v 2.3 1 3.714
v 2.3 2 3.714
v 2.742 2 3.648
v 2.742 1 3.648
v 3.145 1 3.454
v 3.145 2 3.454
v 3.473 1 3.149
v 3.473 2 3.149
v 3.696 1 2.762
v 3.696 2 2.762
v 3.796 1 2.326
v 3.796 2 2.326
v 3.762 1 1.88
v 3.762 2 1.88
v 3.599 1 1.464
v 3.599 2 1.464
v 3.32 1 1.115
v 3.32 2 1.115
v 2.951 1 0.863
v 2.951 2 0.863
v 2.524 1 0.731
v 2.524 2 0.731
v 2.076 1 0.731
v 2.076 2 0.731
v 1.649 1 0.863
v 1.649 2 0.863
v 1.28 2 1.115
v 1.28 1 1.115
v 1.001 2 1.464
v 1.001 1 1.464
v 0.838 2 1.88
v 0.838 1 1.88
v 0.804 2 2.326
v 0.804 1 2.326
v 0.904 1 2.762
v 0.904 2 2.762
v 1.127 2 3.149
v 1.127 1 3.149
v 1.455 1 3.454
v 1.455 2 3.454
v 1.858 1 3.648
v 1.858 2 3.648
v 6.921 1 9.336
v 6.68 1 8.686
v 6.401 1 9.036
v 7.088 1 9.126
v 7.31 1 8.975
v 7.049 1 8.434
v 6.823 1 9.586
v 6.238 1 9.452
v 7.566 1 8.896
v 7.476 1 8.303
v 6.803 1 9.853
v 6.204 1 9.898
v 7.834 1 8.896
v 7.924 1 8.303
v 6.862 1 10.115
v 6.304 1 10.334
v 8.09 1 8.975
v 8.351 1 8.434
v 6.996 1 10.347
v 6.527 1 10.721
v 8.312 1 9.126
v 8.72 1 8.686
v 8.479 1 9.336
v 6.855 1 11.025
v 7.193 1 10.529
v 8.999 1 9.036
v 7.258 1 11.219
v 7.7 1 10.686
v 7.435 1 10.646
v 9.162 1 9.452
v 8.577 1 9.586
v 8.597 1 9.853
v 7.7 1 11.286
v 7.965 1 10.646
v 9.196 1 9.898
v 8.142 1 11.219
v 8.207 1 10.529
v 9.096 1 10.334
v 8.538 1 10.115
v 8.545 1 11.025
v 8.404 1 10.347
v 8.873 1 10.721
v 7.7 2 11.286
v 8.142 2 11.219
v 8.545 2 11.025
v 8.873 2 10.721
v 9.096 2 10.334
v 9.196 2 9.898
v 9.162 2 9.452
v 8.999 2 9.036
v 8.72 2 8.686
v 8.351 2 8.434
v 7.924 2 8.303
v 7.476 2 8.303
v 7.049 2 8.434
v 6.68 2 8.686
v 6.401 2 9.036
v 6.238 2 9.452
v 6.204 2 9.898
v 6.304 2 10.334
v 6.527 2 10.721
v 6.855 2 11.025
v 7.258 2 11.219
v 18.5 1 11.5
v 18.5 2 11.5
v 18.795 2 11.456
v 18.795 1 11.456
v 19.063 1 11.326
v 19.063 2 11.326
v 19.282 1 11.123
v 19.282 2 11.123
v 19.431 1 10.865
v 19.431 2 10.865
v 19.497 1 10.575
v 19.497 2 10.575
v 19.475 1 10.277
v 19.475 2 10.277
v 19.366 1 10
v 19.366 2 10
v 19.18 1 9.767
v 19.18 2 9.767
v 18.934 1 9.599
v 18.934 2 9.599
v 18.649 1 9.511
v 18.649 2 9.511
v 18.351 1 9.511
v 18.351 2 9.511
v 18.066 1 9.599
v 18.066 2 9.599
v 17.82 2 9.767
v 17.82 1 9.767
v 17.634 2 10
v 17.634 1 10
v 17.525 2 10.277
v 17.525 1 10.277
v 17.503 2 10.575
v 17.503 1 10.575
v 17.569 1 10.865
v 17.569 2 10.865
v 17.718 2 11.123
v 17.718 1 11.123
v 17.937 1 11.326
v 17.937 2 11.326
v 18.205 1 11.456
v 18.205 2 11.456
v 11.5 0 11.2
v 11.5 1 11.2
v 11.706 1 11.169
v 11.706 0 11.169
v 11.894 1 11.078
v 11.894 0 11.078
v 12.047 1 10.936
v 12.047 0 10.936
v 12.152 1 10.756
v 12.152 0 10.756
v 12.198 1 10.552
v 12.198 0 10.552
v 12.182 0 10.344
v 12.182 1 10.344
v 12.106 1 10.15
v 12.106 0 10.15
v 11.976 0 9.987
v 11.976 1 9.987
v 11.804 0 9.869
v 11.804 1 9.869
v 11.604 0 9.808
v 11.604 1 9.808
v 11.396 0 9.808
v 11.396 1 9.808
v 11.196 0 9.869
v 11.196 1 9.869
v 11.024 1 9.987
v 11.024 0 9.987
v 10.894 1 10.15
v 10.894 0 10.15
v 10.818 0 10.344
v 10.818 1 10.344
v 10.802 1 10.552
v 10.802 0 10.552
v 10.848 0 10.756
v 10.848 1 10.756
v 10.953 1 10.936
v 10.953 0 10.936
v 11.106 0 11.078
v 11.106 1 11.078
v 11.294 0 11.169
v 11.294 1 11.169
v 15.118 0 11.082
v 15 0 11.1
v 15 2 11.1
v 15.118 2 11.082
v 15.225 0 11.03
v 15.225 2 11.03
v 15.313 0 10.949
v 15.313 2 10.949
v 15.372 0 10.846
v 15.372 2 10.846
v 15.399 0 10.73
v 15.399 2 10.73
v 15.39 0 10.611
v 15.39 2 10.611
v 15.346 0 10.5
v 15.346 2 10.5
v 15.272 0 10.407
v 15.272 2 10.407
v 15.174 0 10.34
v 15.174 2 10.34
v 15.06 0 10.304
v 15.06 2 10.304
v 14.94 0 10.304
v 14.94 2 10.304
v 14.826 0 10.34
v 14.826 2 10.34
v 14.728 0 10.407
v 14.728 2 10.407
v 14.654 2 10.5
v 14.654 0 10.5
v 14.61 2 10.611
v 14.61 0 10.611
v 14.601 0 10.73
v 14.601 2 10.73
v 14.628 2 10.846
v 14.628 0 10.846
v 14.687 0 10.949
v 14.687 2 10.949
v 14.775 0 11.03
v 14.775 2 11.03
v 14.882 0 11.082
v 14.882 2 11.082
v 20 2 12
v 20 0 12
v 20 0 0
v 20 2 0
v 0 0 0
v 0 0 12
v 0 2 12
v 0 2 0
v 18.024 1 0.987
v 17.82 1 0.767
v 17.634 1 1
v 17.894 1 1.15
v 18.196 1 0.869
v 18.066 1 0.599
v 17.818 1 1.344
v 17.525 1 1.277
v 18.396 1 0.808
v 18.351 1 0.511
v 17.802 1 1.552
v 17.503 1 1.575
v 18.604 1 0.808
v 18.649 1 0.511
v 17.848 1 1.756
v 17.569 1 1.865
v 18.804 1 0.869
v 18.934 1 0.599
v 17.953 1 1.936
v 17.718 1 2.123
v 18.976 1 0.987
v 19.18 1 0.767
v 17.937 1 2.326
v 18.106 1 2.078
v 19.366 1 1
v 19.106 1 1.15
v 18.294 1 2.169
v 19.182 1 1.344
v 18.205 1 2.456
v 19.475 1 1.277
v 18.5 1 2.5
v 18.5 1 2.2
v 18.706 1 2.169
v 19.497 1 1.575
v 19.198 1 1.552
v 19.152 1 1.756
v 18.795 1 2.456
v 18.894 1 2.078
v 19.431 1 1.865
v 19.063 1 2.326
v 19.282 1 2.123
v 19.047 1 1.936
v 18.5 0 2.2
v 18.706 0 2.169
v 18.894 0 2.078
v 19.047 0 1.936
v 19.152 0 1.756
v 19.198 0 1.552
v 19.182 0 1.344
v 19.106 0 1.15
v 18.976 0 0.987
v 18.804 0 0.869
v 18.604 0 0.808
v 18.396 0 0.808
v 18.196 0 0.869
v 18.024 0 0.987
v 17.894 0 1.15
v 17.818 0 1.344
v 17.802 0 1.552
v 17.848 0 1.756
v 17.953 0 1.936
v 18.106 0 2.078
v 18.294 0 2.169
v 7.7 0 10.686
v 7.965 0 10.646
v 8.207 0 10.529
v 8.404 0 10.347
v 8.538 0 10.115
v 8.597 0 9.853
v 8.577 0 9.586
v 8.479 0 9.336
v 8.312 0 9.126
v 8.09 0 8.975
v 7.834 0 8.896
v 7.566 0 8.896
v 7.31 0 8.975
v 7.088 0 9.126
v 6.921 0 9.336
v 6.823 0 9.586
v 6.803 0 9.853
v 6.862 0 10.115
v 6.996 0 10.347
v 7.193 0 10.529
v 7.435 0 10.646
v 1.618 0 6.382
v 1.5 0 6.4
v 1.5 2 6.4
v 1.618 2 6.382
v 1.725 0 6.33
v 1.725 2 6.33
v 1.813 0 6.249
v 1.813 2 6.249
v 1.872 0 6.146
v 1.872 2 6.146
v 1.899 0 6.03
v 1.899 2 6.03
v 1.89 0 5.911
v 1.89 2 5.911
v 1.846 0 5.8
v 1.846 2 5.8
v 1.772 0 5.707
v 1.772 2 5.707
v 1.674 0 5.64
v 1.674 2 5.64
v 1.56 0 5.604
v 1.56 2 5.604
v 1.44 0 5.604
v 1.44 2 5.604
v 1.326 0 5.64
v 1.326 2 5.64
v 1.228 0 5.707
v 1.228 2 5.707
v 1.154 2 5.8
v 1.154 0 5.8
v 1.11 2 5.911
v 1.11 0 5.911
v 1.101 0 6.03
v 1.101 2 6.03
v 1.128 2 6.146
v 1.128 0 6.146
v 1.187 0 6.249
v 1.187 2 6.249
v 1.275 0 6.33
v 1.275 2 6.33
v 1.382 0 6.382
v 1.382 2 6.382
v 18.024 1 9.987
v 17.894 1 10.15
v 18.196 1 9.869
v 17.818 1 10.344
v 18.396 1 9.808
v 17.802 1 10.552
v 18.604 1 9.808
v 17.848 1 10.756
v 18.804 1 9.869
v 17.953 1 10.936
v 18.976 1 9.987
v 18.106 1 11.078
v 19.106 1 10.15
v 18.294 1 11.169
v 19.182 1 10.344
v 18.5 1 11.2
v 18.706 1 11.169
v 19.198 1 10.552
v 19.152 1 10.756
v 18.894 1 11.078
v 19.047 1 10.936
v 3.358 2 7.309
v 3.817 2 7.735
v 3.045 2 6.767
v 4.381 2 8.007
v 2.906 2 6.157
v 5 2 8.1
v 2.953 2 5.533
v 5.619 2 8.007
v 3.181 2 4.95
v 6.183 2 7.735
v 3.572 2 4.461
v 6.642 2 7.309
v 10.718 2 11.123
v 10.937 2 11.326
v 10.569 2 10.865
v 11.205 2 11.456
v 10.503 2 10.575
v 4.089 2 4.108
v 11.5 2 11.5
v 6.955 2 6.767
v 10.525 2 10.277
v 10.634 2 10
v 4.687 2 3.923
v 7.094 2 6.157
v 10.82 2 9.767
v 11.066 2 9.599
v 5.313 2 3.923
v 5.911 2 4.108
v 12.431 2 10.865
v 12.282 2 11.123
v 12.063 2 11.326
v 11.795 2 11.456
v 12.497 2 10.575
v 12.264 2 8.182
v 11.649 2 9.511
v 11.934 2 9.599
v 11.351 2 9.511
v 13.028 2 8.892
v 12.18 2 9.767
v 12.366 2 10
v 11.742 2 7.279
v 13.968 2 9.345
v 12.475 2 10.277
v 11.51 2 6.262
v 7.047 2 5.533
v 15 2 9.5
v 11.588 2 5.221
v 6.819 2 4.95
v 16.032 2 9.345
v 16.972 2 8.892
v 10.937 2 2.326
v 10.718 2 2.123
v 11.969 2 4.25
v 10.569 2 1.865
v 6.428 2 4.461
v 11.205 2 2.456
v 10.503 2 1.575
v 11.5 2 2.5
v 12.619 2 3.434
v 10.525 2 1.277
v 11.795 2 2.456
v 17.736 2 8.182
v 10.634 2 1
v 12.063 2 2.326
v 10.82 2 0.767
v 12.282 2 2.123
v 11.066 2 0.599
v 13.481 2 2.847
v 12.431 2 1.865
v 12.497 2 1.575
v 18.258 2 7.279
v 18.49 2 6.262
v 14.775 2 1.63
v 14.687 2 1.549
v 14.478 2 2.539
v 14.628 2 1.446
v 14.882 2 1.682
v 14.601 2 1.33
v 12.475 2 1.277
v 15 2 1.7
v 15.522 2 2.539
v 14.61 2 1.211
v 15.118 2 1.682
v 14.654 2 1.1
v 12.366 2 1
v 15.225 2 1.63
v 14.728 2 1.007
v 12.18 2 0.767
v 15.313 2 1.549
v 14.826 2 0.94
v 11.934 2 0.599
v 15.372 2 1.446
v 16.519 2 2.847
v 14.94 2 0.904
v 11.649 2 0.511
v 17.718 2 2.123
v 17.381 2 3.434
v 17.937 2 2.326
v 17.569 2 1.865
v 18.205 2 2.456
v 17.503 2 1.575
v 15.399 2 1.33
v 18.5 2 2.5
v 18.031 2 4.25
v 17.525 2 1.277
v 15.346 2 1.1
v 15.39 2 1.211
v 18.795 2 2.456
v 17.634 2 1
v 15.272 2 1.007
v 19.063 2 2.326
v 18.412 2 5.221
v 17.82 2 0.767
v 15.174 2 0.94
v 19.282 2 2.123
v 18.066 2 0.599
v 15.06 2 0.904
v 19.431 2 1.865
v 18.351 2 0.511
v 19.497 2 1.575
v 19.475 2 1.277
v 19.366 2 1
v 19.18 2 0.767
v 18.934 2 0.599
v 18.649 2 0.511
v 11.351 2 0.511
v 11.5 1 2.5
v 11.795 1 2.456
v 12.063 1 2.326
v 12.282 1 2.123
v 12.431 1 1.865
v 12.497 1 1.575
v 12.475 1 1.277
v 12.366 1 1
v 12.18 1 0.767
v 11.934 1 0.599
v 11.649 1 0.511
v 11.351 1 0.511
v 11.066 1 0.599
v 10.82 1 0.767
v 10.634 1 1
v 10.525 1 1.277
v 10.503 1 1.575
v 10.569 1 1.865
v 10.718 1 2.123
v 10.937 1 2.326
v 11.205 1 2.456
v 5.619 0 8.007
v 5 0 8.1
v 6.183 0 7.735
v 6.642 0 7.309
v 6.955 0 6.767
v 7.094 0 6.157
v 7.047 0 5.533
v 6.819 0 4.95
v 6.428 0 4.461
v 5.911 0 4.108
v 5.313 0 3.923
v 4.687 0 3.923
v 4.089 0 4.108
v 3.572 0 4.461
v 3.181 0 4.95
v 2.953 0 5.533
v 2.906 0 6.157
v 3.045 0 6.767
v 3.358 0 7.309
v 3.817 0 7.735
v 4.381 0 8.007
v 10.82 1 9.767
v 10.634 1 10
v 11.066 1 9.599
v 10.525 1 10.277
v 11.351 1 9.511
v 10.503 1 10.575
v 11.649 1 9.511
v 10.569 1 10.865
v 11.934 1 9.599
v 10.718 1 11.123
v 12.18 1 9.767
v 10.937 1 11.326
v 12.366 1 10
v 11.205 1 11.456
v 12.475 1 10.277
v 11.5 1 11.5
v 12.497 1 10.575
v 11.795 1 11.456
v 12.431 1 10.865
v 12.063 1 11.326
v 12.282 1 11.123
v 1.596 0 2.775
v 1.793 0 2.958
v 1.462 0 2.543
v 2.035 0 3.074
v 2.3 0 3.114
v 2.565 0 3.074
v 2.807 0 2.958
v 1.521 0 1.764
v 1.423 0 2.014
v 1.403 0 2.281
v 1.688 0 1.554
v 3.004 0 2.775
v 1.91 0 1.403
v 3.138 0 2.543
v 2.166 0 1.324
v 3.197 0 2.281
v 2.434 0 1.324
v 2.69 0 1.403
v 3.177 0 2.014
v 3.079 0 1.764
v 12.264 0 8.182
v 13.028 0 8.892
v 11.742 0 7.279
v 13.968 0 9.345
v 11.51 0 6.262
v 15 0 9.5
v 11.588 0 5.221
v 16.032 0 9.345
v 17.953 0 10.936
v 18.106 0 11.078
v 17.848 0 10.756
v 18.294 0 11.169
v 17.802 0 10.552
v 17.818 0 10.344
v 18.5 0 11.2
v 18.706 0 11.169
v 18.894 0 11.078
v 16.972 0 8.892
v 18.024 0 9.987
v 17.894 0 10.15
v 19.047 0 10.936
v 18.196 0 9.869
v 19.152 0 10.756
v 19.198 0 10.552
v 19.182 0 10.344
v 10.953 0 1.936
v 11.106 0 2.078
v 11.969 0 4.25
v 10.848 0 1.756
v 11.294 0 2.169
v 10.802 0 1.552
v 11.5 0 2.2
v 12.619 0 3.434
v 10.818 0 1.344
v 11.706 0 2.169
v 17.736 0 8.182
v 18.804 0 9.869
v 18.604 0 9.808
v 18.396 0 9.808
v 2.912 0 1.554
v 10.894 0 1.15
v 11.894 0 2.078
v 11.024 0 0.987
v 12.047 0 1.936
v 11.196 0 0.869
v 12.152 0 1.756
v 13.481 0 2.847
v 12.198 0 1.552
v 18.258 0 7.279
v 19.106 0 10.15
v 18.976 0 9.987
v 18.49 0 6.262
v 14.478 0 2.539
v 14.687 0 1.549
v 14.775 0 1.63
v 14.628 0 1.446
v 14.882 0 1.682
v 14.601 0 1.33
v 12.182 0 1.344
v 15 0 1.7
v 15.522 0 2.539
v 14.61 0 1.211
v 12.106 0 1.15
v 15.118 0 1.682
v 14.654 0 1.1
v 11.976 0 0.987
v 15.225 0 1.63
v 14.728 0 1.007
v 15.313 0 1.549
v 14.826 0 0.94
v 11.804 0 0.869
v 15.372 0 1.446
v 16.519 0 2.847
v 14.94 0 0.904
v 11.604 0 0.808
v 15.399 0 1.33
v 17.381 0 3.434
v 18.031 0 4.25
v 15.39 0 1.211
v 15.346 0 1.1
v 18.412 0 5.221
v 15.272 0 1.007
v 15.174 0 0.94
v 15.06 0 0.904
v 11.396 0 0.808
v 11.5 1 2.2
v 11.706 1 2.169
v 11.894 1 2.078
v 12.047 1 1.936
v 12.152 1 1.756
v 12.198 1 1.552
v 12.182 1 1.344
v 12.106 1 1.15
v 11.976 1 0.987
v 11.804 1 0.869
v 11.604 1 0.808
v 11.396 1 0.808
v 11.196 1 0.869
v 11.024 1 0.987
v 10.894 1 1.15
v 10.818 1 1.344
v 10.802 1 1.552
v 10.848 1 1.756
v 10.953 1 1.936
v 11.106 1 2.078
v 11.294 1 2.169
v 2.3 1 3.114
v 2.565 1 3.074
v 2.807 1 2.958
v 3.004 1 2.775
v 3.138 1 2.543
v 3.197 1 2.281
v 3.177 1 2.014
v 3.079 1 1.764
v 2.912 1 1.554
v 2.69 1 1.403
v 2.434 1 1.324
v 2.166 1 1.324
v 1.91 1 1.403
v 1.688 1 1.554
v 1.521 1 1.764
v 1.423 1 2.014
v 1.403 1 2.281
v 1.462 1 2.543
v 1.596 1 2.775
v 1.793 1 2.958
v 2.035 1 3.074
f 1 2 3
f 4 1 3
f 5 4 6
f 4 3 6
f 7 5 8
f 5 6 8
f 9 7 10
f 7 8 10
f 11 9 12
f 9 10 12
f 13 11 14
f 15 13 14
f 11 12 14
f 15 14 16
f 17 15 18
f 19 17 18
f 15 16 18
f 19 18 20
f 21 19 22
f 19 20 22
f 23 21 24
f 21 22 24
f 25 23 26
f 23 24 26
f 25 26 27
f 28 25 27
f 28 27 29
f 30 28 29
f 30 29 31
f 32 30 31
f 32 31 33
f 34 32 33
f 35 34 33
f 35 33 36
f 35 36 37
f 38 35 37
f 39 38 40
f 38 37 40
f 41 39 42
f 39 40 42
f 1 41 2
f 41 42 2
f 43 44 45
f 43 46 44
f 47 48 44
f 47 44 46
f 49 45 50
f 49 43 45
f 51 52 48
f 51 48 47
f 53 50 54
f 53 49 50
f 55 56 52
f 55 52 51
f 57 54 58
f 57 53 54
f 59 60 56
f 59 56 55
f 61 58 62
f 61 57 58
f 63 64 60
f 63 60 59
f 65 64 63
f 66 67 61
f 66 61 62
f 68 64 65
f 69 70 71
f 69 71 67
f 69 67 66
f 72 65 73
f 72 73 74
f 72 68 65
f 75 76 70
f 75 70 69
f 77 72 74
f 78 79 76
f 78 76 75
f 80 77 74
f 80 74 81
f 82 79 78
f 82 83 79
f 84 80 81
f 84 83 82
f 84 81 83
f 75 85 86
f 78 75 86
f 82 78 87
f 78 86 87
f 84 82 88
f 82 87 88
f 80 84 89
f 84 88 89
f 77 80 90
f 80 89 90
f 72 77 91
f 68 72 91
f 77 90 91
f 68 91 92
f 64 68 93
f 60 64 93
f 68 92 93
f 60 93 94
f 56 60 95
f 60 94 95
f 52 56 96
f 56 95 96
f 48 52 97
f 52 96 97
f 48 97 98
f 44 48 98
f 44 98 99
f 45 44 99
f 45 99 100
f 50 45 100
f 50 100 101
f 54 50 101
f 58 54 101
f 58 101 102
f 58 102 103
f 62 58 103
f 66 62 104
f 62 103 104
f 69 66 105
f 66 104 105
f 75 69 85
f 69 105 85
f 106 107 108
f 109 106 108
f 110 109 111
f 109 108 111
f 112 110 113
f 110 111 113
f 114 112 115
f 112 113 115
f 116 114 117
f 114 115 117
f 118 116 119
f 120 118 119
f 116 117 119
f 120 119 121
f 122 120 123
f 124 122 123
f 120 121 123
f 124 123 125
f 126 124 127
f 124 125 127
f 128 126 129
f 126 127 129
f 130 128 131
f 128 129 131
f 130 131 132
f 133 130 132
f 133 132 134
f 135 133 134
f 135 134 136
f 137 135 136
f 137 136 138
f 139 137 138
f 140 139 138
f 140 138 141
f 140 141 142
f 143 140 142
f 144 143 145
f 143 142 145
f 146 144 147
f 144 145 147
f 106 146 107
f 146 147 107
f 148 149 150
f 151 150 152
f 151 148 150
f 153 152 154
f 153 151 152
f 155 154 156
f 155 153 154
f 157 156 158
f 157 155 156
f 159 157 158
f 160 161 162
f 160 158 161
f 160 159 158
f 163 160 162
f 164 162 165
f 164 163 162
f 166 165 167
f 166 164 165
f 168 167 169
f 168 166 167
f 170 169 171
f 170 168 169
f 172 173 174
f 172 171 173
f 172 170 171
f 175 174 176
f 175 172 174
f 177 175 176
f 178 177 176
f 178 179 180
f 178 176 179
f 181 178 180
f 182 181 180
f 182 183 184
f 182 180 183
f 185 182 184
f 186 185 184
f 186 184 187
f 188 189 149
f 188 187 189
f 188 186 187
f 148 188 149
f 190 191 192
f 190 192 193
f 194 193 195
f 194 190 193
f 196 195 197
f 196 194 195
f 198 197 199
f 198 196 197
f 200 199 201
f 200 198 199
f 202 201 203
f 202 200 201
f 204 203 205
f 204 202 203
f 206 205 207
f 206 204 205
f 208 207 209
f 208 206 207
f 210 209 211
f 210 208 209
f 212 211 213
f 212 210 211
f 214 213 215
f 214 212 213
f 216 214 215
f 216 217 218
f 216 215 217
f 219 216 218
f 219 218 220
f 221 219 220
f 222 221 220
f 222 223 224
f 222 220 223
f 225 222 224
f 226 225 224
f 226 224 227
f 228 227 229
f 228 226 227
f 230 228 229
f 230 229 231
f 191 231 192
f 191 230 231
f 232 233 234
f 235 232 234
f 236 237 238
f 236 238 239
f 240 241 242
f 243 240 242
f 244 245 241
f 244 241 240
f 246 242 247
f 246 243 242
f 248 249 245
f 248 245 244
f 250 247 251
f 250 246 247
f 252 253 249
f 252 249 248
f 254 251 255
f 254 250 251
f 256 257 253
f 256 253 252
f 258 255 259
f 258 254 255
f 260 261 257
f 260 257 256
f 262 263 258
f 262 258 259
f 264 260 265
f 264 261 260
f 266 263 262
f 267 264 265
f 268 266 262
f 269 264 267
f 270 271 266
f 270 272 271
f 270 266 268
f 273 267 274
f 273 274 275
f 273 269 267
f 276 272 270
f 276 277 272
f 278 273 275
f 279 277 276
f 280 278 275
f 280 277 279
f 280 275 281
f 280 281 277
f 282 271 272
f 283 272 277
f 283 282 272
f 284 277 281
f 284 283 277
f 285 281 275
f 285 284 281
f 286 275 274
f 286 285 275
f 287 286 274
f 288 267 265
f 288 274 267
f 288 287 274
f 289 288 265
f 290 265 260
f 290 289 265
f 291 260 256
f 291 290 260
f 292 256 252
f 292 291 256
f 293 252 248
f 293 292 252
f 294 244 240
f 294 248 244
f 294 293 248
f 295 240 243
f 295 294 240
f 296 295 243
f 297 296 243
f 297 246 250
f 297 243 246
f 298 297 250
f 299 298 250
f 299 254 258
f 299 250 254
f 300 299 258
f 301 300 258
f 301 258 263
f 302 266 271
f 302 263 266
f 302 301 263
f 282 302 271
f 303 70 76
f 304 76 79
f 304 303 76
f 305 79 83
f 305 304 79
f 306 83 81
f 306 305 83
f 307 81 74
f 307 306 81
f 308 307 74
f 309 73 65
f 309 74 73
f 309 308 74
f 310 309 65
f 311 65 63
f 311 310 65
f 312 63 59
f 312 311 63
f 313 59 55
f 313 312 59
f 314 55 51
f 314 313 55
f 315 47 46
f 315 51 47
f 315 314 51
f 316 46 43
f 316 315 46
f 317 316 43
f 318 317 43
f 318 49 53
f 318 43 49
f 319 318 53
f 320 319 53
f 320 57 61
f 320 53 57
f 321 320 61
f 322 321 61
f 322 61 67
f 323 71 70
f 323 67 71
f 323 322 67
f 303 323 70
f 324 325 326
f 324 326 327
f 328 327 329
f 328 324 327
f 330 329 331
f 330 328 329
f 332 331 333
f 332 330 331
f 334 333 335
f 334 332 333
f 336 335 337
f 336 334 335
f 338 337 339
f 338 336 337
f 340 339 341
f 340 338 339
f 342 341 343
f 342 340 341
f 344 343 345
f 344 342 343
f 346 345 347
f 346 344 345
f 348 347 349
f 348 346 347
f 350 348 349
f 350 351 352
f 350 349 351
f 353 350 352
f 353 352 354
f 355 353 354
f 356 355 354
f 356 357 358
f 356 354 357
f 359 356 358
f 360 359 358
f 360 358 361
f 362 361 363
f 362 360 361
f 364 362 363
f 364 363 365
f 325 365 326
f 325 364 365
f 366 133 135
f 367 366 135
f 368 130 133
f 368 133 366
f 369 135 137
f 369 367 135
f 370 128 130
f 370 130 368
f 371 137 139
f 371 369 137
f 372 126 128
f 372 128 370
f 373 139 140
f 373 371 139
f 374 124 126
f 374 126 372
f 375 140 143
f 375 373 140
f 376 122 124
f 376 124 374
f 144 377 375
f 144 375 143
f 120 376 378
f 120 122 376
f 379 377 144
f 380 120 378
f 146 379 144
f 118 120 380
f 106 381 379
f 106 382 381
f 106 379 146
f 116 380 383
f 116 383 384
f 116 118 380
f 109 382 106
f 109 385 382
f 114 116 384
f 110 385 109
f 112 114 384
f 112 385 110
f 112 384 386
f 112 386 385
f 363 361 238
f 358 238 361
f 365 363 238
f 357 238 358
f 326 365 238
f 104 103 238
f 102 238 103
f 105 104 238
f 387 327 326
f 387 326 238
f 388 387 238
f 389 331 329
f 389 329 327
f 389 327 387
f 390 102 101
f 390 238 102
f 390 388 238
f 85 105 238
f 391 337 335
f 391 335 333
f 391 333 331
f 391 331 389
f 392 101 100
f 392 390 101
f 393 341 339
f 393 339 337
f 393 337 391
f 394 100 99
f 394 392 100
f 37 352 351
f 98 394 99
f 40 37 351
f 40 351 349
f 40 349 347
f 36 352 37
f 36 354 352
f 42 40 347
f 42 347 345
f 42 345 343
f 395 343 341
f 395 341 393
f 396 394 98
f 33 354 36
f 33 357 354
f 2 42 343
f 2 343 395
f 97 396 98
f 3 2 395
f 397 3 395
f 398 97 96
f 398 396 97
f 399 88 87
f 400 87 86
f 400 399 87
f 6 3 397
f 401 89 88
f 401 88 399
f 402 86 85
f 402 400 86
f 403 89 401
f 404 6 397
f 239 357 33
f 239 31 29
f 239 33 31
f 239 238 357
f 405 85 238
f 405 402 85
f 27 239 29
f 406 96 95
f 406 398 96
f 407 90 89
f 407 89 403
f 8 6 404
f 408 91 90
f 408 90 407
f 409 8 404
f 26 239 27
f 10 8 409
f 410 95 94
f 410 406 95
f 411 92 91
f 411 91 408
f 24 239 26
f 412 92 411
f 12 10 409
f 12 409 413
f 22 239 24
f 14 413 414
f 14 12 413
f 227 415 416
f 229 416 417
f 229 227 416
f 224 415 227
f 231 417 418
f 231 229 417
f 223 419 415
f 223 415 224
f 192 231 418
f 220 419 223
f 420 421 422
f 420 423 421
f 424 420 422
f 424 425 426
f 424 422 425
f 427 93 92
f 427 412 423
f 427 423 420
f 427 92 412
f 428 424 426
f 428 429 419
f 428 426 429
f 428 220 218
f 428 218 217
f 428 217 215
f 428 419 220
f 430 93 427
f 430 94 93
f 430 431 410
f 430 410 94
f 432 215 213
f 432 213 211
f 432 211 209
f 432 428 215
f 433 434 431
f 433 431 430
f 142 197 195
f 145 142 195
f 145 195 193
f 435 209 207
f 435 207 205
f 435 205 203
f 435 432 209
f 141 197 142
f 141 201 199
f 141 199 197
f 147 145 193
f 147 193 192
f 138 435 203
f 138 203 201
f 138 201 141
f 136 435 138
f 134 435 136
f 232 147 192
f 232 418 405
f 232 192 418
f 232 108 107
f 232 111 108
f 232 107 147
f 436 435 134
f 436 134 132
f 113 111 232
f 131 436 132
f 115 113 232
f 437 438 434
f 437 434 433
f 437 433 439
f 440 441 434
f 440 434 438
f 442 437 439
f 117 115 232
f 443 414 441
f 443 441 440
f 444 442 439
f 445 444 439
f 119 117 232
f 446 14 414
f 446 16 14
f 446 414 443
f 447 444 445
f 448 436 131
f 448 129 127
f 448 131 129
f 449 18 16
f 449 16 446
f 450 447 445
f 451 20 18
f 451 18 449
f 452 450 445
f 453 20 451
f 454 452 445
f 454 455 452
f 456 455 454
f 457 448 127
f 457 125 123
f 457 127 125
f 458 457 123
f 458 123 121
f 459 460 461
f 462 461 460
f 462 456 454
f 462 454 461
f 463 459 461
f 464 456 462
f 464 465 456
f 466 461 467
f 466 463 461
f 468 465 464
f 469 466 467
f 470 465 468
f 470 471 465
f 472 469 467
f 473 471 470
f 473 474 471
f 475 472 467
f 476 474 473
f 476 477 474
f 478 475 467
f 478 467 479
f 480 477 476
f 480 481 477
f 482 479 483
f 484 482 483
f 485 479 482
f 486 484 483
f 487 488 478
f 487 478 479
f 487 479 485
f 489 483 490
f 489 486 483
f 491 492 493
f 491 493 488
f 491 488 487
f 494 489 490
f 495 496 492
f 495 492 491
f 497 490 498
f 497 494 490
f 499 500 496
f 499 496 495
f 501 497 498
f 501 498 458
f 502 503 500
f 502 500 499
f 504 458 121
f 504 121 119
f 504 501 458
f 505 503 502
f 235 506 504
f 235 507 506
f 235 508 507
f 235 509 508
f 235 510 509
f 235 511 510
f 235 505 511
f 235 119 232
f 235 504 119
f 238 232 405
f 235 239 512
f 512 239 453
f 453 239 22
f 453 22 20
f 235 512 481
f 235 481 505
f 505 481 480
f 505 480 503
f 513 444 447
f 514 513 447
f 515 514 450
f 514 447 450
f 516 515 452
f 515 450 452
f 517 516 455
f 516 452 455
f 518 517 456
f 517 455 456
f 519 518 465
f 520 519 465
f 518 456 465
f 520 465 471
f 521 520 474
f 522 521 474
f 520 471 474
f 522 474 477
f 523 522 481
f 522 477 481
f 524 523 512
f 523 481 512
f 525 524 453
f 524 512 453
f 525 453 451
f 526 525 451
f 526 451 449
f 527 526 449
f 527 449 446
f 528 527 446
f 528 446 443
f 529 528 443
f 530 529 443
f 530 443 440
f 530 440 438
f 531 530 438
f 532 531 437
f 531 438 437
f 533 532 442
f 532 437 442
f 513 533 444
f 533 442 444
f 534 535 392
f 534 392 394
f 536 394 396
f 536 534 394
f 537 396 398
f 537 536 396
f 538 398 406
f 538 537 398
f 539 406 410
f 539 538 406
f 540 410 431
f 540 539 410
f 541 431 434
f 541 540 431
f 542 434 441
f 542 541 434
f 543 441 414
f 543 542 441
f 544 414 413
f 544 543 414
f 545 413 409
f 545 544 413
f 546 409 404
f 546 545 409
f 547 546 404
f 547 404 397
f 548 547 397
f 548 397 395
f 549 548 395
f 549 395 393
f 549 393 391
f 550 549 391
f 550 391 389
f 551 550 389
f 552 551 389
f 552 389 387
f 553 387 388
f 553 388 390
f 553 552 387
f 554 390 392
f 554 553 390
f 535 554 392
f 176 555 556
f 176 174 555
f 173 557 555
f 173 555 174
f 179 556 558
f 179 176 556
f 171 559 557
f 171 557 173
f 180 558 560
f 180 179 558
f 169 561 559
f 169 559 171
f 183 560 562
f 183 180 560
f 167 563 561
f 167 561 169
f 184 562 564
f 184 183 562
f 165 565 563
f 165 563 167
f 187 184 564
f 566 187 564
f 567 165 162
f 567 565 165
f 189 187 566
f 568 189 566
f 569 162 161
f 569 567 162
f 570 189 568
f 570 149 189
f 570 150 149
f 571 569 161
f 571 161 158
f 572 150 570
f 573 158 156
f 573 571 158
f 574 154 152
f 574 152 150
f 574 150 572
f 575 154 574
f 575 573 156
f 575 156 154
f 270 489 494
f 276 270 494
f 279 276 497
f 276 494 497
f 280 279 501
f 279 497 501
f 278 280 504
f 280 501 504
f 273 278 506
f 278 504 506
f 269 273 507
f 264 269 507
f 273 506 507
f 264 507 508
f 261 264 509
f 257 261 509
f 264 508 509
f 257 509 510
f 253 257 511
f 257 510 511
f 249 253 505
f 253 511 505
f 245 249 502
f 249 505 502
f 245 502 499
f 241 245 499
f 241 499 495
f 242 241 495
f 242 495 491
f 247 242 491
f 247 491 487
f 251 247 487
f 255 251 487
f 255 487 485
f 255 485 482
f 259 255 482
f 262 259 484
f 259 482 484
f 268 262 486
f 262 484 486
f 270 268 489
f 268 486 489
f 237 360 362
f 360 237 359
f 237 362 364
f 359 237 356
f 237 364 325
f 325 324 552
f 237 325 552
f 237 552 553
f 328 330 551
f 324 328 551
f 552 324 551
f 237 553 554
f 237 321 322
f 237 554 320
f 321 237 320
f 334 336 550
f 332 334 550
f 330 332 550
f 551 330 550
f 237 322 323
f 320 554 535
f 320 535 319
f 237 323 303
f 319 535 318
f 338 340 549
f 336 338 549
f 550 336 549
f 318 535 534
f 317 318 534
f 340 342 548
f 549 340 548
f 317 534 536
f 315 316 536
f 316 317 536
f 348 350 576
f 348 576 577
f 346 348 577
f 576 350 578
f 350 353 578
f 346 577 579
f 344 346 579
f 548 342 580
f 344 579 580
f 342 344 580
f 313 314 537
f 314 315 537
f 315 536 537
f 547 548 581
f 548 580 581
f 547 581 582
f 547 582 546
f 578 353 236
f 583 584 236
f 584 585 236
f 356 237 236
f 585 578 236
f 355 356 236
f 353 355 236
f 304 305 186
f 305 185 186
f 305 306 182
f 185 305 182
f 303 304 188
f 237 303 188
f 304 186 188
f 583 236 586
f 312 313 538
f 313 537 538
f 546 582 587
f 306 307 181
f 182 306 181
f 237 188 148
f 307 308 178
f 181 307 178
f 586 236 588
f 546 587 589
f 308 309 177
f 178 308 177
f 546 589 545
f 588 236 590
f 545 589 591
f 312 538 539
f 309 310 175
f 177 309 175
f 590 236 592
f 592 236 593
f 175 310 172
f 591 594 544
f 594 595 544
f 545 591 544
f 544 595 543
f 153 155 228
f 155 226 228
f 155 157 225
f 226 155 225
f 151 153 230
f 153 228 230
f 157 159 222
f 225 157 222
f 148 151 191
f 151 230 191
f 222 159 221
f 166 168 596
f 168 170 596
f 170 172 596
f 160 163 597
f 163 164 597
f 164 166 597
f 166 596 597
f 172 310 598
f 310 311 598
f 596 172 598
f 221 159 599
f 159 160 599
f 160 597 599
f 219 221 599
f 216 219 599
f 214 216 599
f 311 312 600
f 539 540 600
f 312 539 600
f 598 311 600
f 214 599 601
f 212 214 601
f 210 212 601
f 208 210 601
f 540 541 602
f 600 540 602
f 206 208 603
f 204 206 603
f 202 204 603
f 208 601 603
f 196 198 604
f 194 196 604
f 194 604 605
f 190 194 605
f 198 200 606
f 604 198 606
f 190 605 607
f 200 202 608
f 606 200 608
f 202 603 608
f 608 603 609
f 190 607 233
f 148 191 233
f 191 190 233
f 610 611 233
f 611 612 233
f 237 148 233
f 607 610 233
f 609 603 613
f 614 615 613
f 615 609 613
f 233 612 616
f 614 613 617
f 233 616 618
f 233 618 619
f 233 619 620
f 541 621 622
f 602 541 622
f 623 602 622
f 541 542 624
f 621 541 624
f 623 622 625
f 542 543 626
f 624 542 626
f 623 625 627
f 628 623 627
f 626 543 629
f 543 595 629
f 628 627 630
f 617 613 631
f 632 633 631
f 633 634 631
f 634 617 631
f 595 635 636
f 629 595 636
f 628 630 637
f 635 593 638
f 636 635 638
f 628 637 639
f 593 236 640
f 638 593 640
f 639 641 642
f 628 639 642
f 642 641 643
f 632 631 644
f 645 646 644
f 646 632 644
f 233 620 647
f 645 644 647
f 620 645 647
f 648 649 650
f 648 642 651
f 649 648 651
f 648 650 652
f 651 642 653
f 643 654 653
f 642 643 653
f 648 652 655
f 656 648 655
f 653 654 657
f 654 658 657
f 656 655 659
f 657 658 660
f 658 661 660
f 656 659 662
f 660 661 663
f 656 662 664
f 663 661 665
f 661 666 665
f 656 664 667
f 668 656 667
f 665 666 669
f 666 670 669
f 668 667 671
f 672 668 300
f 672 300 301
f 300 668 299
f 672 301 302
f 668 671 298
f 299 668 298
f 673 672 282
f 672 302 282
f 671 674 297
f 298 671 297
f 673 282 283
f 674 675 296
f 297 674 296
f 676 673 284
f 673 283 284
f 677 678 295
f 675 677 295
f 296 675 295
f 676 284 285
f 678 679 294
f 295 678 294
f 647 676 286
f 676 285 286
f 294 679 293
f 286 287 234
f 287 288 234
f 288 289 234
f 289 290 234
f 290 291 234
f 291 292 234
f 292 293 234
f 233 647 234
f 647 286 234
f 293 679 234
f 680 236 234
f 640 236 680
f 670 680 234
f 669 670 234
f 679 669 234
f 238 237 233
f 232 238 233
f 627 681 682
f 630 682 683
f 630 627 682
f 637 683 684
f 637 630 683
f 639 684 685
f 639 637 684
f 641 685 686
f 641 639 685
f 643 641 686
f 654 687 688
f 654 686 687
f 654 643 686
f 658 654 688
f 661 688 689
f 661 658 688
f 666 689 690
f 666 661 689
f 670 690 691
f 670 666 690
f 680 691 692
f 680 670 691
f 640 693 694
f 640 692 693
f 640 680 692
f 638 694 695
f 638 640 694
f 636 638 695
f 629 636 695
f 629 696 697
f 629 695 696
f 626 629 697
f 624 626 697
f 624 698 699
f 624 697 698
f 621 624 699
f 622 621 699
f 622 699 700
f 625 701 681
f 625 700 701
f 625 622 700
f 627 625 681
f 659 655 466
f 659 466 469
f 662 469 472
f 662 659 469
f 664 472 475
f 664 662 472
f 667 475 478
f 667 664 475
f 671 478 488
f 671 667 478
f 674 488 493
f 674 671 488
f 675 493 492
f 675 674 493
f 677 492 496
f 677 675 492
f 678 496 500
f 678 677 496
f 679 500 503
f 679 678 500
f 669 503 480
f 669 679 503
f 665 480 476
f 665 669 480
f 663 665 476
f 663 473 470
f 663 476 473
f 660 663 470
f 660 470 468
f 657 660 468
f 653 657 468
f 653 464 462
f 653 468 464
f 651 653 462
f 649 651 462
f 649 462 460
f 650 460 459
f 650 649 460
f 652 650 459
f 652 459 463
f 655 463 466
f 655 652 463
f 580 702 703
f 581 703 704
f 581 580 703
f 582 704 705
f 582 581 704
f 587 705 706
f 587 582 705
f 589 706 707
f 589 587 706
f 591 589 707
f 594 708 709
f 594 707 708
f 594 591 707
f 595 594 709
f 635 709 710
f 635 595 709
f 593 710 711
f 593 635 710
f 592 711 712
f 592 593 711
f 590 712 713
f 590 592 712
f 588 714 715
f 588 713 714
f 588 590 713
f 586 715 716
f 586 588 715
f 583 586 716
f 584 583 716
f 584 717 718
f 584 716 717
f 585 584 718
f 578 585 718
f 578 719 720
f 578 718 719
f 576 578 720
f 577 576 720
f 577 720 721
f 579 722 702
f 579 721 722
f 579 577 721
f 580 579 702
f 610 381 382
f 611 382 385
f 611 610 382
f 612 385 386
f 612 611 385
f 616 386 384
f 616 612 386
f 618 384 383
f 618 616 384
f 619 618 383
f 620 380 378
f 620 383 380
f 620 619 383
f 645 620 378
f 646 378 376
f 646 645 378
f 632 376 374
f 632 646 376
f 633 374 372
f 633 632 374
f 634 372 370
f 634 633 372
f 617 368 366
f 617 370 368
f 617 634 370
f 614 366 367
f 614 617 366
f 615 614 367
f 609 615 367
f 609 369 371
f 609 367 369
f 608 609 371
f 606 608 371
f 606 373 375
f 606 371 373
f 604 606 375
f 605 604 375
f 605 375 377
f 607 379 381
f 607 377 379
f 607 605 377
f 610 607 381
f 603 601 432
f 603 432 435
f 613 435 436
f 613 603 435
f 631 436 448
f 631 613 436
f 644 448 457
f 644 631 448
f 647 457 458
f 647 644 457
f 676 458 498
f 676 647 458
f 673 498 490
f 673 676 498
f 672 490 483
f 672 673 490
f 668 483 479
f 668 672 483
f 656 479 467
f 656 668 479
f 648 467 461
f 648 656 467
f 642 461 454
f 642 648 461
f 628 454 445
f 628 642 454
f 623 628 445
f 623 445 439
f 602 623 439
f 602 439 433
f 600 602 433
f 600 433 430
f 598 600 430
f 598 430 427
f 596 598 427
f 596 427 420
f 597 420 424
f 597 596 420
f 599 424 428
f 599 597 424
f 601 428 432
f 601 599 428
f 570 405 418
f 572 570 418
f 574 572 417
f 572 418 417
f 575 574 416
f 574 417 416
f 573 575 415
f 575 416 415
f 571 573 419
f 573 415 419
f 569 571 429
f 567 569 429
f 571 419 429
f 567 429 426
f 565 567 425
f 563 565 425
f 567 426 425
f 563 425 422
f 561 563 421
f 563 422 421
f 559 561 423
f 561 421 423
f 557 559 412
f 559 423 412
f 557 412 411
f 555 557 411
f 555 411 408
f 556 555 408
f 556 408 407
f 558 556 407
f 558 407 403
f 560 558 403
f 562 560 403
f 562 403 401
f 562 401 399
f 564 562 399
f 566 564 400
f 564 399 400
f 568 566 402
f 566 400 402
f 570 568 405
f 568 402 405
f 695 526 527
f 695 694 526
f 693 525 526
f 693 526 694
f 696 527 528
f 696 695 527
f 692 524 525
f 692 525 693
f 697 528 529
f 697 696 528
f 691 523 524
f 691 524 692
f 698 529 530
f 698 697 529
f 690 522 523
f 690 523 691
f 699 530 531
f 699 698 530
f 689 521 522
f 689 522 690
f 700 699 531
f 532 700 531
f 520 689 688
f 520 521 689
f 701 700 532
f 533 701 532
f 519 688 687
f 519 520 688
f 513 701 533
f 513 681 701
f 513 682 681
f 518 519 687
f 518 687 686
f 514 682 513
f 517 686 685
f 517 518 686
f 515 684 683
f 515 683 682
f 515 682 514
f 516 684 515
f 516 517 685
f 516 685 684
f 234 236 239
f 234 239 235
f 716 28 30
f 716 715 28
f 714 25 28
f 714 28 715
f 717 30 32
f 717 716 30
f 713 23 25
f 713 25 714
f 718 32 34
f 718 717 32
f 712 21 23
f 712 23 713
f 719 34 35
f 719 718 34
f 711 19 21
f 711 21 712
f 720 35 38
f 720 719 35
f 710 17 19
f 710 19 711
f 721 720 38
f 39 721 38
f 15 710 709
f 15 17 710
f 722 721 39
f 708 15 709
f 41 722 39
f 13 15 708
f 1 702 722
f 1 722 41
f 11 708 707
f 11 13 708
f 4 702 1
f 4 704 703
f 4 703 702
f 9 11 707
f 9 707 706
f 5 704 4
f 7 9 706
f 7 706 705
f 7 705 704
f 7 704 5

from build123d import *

# Parameters (mm, degrees)
SKETCH_1_W          = 20
SKETCH_1_H          = 12
SKETCH_1_R          = 2.1
SKETCH_1_R_2        = 3.5
EXTRUDE_1_DEPTH     = 2
SKETCH_2_R          = 0.9
SKETCH_2_R_2        = 0.7
CUT_EXTRUDE_1_DEPTH = 24.409399821
CUT_EXTRUDE_START   = 2
SKETCH_2_3_R        = 1.5
CUT_EXTRUDE_2_DEPTH = 1
SKETCH_2_4_R        = 1
CUT_EXTRUDE_3_DEPTH = 1
SKETCH_5_R          = 0.4
CUT_EXTRUDE_4_DEPTH = 24.59745749


with BuildPart() as part:
    # 草图1 → 凸台-拉伸1 (new body)
    with BuildSketch(Plane(origin=(0, 0, 0), x_dir=(1, 0, 0), z_dir=(0, 1, 0))):
        with Locations((10, -6)):
            Rectangle(SKETCH_1_W, SKETCH_1_H)
        with Locations(Location((5, -6, 0), (0, 0, 270))):
            Circle(SKETCH_1_R, mode=Mode.SUBTRACT)
        with Locations(Location((15, -6, 0), (0, 0, 270))):
            Circle(SKETCH_1_R_2, mode=Mode.SUBTRACT)
    extrude(amount=EXTRUDE_1_DEPTH)

    # 草图2 → 切除-拉伸1 (cut, through all)
    with BuildSketch(Plane(origin=(0, 0, 0), x_dir=(1, 0, 0), z_dir=(0, 1, 0))):
        with Locations(Location((2.3, -2.214171161, 0), (0, 0, 270))):
            Circle(SKETCH_2_R)
        with Locations(Location((7.7, -9.785828839, 0), (0, 0, 270))):
            Circle(SKETCH_2_R)
        with Locations(Location((11.5, -1.5, 0), (0, 0, 270))):
            Circle(SKETCH_2_R_2)
        with Locations(Location((18.5, -10.5, 0), (0, 0, 270))):
            Circle(SKETCH_2_R_2)
        with Locations(Location((18.5, -1.5, 0), (0, 0, 270))):
            Circle(SKETCH_2_R_2)
        with Locations(Location((11.5, -10.5, 0), (0, 0, 270))):
            Circle(SKETCH_2_R_2)
    extrude(amount=CUT_EXTRUDE_1_DEPTH, mode=Mode.SUBTRACT)

    # 草图2<3> → 切除-拉伸2 (cut)
    with BuildSketch(Plane(origin=(0, 0, 0), x_dir=(1, 0, 0), z_dir=(0, 1, 0)).offset(CUT_EXTRUDE_START)):
        with Locations(Location((2.3, -2.214171161, 0), (0, 0, 270))):
            Circle(SKETCH_2_3_R)
        with Locations(Location((7.7, -9.785828839, 0), (0, 0, 270))):
            Circle(SKETCH_2_3_R)
    extrude(amount=-CUT_EXTRUDE_2_DEPTH, mode=Mode.SUBTRACT)

    # 草图2<4> → 切除-拉伸3 (cut)
    with BuildSketch(Plane(origin=(0, 0, 0), x_dir=(1, 0, 0), z_dir=(0, 1, 0)).offset(CUT_EXTRUDE_START)):
        with Locations(Location((11.5, -1.5, 0), (0, 0, 270))):
            Circle(SKETCH_2_4_R)
        with Locations(Location((18.5, -10.5, 0), (0, 0, 270))):
            Circle(SKETCH_2_4_R)
        with Locations(Location((18.5, -1.5, 0), (0, 0, 270))):
            Circle(SKETCH_2_4_R)
        with Locations(Location((11.5, -10.5, 0), (0, 0, 270))):
            Circle(SKETCH_2_4_R)
    extrude(amount=-CUT_EXTRUDE_3_DEPTH, mode=Mode.SUBTRACT)

    # 草图5 → 切除-拉伸4 (cut, through all)
    with BuildSketch(Plane(origin=(5, -15.2, 6), x_dir=(0, 0, -1), z_dir=(0, 1, 0))):
        with Locations(Location((0, 3.5, 0), (0, 0, 180))):
            Circle(SKETCH_5_R)
        with Locations(Location((-4.7, -10, 0), (0, 0, 180))):
            Circle(SKETCH_5_R)
        with Locations(Location((4.7, -10, 0), (0, 0, 180))):
            Circle(SKETCH_5_R)
    extrude(amount=CUT_EXTRUDE_4_DEPTH, mode=Mode.SUBTRACT)


solid = part.part
